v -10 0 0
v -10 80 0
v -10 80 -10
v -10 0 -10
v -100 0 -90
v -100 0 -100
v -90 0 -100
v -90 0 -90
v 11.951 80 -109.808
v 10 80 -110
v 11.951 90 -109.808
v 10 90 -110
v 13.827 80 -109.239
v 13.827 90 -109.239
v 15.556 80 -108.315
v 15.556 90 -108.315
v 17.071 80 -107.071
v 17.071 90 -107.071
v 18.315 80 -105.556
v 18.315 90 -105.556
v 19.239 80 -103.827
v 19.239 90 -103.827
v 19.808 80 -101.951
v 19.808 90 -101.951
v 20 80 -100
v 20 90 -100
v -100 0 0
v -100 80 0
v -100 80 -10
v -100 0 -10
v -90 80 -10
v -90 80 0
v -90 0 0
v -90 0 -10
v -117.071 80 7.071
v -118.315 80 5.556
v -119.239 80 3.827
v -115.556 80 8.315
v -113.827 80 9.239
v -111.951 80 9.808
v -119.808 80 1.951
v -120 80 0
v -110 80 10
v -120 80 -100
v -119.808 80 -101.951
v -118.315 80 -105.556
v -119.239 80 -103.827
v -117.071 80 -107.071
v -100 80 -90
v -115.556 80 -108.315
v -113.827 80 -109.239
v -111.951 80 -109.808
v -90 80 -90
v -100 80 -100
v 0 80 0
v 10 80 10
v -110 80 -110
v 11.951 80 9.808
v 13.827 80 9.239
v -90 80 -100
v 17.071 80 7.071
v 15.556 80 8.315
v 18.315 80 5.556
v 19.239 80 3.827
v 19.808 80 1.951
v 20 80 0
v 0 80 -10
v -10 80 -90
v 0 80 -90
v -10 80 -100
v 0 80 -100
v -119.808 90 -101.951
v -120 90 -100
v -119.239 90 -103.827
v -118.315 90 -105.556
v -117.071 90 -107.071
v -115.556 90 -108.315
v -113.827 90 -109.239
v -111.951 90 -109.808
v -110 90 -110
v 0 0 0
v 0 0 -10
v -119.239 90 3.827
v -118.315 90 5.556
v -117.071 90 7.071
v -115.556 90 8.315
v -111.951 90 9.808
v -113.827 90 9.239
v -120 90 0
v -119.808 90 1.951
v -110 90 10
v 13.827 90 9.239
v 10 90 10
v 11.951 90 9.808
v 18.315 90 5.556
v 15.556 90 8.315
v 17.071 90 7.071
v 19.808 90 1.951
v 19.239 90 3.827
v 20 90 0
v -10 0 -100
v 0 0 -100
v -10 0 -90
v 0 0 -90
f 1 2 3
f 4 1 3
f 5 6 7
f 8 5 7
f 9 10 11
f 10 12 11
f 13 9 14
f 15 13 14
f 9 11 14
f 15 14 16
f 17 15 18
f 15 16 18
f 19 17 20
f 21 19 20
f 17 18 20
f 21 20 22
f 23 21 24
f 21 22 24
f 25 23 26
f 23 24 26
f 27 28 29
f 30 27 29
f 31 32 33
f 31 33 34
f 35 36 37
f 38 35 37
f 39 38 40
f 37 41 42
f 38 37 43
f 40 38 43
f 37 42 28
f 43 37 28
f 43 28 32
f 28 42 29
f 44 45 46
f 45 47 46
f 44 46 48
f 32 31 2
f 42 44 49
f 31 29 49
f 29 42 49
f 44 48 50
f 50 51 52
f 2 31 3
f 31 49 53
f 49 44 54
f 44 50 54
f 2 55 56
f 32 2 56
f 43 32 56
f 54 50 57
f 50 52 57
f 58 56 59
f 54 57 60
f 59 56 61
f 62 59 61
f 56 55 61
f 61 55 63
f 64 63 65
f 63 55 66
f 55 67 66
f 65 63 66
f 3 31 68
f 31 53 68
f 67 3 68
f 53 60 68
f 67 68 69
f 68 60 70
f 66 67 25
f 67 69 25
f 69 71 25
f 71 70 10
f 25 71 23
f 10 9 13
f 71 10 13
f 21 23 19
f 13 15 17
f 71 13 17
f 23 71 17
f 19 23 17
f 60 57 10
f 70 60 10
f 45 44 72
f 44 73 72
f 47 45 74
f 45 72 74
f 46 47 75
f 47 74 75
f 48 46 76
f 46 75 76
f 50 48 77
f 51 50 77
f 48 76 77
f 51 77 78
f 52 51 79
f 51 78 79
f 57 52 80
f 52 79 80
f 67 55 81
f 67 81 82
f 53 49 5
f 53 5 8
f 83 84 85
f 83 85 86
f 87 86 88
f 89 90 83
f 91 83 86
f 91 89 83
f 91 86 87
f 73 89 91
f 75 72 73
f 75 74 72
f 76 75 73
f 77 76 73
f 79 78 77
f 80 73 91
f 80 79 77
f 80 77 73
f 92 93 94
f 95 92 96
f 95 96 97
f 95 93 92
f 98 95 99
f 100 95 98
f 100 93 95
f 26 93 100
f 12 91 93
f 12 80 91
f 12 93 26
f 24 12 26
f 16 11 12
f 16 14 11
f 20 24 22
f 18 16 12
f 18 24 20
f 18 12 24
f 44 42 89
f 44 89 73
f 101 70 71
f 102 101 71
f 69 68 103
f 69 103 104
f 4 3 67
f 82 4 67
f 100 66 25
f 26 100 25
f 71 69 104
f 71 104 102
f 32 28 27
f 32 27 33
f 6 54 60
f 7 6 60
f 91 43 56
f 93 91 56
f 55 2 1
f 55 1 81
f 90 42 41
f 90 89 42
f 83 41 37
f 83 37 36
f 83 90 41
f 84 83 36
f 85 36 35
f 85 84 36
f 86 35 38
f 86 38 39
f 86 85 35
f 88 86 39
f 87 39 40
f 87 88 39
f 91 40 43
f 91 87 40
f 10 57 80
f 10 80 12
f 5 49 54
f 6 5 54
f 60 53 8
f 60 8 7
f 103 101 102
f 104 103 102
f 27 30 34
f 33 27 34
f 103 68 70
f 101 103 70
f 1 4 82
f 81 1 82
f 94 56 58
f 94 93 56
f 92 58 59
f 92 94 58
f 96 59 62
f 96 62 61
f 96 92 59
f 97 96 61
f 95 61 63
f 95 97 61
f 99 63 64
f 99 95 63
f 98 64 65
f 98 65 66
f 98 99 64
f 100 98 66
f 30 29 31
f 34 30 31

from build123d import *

# Parameters (mm, degrees)
SKETCH1_W             = 10
SKETCH1_H             = 10
BOSS_EXTRUDE1_DEPTH   = 80
BOSS_EXTRUDE1_2_DEPTH = 80
BOSS_EXTRUDE1_3_DEPTH = 80
BOSS_EXTRUDE1_4_DEPTH = 80
SKETCH2_W             = 140
SKETCH2_H             = 120
BOSS_EXTRUDE2_DEPTH   = 10
FILLET1_R             = 10


with BuildPart() as part:
    # Sketch1 → Boss-Extrude1 (new body)
    with BuildSketch(Plane(origin=(0, 0, 0), x_dir=(1, 0, 0), z_dir=(0, 1, 0))):
        with Locations((-5, 95)):
            Rectangle(SKETCH1_W, SKETCH1_H)
    extrude(amount=BOSS_EXTRUDE1_DEPTH)



with BuildPart() as body_2:
    # Sketch1 → Boss-Extrude1 2 (new body)
    with BuildSketch(Plane(origin=(0, 0, 0), x_dir=(1, 0, 0), z_dir=(0, 1, 0))):
        with Locations((-5, 5)):
            Rectangle(SKETCH1_W, SKETCH1_H)
    extrude(amount=BOSS_EXTRUDE1_2_DEPTH)


with BuildPart() as body_3:
    # Sketch1 → Boss-Extrude1 3 (new body)
    with BuildSketch(Plane(origin=(0, 0, 0), x_dir=(1, 0, 0), z_dir=(0, 1, 0))):
        with Locations((-95, 5)):
            Rectangle(SKETCH1_W, SKETCH1_H)
    extrude(amount=BOSS_EXTRUDE1_3_DEPTH)


with BuildPart() as body_4:
    # Sketch1 → Boss-Extrude1 4 (new body)
    with BuildSketch(Plane(origin=(0, 0, 0), x_dir=(1, 0, 0), z_dir=(0, 1, 0))):
        with Locations((-95, 95)):
            Rectangle(SKETCH1_W, SKETCH1_H)
    extrude(amount=BOSS_EXTRUDE1_4_DEPTH)


with BuildPart() as part_1:
    add(part.part)

    add(body_2.part)  # Boss-Extrude2 merges body 2

    add(body_3.part)  # Boss-Extrude2 merges body 3

    add(body_4.part)  # Boss-Extrude2 merges body 4
    # Sketch2 → Boss-Extrude2 (add)
    with BuildSketch(Plane(origin=(0, 80, 0), x_dir=(1, 0, 0), z_dir=(0, 1, 0))):
        with Locations((-50, 50)):
            Rectangle(SKETCH2_W, SKETCH2_H)
    extrude(amount=BOSS_EXTRUDE2_DEPTH)

    # Fillet1
    fillet1_edges = [part_1.edges().sort_by_distance(p)[0] for p in [
        (-120, 85, -110),
        (-120, 85, 10),
        (20, 85, 10),
        (20, 85, -110),
    ]]
    fillet(fillet1_edges, radius=FILLET1_R)


solid = part_1.part
